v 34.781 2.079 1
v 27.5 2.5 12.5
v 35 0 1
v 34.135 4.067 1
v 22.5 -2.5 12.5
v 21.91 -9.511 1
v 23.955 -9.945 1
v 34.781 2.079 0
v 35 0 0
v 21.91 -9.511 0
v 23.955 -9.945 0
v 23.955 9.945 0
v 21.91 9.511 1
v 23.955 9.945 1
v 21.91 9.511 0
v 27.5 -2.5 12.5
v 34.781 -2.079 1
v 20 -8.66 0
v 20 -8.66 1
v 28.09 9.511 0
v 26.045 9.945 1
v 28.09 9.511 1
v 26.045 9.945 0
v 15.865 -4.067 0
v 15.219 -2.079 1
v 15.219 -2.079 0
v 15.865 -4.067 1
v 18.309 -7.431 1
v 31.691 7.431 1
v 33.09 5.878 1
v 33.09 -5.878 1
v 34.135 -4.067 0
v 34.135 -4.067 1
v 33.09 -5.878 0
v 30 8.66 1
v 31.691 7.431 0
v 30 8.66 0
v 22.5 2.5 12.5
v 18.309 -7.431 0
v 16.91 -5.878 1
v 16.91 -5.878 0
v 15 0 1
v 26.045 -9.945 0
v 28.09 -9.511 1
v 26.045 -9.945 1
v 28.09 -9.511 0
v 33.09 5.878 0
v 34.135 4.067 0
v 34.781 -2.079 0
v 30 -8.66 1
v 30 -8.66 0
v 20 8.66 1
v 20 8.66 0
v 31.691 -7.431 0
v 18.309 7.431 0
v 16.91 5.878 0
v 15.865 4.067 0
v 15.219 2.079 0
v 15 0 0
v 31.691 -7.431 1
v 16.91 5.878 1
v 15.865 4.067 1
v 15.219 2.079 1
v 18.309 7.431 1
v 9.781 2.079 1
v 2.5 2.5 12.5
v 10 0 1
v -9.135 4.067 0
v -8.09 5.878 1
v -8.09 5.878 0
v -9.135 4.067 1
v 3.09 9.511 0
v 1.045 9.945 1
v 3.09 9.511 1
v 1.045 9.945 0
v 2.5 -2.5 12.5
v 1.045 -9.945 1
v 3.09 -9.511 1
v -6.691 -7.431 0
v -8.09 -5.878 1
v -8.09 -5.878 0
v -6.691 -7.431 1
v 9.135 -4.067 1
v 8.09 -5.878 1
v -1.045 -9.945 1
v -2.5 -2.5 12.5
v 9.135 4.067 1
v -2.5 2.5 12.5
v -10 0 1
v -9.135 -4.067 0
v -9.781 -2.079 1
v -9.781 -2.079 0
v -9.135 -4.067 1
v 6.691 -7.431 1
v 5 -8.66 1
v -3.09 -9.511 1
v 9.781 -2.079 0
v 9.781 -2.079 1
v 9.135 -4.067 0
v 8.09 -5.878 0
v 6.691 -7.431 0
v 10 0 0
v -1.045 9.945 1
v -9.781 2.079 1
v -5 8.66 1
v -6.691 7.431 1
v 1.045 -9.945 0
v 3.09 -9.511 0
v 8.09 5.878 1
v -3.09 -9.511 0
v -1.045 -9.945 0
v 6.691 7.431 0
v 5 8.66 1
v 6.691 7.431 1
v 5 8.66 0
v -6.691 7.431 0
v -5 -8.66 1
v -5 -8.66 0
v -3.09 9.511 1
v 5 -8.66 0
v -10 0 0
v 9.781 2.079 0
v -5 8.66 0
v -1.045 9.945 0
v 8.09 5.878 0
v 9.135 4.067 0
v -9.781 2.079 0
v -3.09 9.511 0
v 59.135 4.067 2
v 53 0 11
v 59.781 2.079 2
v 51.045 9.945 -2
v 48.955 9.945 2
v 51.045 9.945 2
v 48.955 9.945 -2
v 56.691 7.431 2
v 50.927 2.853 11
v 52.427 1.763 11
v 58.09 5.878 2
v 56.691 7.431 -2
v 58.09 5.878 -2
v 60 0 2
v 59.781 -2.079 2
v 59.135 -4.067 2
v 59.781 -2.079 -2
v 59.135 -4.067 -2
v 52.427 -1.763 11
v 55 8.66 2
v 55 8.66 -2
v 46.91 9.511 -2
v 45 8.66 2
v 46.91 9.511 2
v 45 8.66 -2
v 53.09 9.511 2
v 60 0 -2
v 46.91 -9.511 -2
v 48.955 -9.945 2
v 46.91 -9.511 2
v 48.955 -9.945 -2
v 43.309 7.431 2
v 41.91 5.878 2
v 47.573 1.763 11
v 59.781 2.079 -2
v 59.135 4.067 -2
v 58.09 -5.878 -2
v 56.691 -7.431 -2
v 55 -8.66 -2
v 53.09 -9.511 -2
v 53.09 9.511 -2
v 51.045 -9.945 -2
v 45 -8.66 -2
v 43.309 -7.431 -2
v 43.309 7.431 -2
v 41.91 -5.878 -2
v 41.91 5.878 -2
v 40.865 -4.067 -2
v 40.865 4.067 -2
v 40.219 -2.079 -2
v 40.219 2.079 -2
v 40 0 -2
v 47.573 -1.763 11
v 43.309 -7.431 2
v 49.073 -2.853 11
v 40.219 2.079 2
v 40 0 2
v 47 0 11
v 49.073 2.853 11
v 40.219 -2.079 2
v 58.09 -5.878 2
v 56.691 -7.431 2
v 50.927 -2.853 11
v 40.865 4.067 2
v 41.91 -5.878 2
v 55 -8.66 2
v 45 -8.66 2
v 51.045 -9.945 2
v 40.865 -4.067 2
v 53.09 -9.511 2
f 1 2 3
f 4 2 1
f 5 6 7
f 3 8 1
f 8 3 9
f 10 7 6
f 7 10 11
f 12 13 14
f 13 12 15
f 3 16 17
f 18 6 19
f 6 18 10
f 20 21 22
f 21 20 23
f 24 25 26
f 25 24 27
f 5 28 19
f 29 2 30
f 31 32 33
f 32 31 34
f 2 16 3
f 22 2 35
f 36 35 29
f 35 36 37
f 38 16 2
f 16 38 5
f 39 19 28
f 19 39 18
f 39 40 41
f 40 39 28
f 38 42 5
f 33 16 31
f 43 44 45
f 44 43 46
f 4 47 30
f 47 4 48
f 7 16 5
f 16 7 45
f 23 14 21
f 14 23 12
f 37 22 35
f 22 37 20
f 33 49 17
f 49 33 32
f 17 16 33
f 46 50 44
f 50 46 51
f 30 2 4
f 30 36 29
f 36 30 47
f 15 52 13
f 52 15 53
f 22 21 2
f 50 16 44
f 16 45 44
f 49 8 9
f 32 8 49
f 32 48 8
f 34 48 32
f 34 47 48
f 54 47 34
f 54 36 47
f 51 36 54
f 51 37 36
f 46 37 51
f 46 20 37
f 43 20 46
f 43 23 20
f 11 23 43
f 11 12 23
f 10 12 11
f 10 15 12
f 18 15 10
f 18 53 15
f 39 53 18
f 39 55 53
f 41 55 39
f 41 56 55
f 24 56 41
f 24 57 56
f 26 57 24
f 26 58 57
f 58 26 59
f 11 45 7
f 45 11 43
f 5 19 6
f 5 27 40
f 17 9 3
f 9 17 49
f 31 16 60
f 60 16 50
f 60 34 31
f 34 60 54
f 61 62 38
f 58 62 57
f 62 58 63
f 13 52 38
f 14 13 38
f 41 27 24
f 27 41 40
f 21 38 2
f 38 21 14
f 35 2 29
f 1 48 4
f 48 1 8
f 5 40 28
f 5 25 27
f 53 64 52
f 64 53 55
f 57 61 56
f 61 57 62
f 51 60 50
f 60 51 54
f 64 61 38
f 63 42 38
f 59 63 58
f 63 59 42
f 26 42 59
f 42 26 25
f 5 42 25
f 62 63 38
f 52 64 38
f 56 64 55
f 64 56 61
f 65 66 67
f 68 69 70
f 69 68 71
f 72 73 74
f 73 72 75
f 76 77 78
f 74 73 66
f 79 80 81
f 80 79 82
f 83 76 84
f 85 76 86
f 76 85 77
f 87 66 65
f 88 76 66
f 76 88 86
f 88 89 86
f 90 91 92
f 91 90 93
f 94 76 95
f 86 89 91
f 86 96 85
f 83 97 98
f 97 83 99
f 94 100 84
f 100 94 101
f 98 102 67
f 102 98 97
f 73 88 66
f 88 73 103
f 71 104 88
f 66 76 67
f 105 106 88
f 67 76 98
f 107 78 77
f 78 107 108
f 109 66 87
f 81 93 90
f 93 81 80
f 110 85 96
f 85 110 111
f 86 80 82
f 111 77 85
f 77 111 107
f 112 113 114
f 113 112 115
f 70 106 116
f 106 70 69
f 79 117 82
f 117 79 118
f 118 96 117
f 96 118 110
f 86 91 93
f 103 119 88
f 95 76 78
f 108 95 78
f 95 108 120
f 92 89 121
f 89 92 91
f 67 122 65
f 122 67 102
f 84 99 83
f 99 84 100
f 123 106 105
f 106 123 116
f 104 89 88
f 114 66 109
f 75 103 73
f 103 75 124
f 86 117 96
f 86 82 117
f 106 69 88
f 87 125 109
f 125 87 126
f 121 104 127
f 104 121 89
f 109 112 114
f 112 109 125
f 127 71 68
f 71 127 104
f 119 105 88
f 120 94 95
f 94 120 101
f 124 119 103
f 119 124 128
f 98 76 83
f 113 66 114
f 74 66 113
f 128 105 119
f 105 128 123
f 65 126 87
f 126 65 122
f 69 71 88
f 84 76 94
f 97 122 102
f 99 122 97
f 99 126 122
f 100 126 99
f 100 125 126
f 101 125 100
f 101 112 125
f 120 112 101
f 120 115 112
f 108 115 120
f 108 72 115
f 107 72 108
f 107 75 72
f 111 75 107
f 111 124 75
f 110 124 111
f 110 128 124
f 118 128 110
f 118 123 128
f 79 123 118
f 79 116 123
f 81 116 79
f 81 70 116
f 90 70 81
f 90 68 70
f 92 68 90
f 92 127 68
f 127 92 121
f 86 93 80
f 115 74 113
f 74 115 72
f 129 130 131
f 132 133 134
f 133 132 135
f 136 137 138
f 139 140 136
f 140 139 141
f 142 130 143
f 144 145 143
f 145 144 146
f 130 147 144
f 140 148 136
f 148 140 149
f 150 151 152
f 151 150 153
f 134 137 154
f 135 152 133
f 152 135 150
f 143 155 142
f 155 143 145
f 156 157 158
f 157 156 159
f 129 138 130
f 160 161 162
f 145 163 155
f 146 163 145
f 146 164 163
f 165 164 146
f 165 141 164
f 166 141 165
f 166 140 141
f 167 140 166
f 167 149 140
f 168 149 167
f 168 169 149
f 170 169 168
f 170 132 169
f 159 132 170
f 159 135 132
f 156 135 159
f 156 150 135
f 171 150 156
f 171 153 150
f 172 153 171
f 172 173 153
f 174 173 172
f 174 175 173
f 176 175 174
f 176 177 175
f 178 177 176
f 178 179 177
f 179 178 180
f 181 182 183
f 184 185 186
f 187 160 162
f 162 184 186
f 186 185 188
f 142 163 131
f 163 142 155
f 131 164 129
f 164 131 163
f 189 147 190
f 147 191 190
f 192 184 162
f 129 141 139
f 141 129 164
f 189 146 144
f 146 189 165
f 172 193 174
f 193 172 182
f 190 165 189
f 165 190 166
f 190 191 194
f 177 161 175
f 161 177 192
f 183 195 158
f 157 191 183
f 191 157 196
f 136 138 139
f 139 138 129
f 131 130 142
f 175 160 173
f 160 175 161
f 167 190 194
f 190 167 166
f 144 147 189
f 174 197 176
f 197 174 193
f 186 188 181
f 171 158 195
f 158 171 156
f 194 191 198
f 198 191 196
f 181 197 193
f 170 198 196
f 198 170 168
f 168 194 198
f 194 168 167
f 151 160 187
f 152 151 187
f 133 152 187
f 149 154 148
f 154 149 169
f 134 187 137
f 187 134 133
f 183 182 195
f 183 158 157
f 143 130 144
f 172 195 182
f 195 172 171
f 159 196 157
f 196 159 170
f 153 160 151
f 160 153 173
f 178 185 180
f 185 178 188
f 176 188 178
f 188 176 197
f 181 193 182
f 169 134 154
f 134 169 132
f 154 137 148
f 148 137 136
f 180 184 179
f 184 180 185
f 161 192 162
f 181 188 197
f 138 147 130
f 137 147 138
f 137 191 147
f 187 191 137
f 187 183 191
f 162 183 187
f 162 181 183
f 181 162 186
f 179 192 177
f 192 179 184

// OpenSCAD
// Empty
hull();
// No children
hull() { }

// Hull of hull (forces internal cache to be initialized; this has caused a crash earlier)
translate([25,0,0]) hull() hull3test();

module hull3test() {
  hull() {
    cylinder(r=10, h=1);
    translate([0,0,10]) cube([5,5,5], center=true);
  }
}
hull3test();

translate([50,0,0]) hull() {
  translate([0,0,10]) cylinder(r=3);
  difference() {
    cylinder(r=10, h=4, center=true);
    cylinder(r=5, h=5, center=true);
  }
}

// Don't Crash (issue 188)

translate([-5,-5,-5]) {
  hull() {
    intersection() {
      cube([1,1,1]);
      translate([-1,-1,-1]) cube([1,1,1]);
    }
  }
}

module hull3null() {
  hull() {
    cube(0);
    sphere(0);
  }
}
hull3null();
